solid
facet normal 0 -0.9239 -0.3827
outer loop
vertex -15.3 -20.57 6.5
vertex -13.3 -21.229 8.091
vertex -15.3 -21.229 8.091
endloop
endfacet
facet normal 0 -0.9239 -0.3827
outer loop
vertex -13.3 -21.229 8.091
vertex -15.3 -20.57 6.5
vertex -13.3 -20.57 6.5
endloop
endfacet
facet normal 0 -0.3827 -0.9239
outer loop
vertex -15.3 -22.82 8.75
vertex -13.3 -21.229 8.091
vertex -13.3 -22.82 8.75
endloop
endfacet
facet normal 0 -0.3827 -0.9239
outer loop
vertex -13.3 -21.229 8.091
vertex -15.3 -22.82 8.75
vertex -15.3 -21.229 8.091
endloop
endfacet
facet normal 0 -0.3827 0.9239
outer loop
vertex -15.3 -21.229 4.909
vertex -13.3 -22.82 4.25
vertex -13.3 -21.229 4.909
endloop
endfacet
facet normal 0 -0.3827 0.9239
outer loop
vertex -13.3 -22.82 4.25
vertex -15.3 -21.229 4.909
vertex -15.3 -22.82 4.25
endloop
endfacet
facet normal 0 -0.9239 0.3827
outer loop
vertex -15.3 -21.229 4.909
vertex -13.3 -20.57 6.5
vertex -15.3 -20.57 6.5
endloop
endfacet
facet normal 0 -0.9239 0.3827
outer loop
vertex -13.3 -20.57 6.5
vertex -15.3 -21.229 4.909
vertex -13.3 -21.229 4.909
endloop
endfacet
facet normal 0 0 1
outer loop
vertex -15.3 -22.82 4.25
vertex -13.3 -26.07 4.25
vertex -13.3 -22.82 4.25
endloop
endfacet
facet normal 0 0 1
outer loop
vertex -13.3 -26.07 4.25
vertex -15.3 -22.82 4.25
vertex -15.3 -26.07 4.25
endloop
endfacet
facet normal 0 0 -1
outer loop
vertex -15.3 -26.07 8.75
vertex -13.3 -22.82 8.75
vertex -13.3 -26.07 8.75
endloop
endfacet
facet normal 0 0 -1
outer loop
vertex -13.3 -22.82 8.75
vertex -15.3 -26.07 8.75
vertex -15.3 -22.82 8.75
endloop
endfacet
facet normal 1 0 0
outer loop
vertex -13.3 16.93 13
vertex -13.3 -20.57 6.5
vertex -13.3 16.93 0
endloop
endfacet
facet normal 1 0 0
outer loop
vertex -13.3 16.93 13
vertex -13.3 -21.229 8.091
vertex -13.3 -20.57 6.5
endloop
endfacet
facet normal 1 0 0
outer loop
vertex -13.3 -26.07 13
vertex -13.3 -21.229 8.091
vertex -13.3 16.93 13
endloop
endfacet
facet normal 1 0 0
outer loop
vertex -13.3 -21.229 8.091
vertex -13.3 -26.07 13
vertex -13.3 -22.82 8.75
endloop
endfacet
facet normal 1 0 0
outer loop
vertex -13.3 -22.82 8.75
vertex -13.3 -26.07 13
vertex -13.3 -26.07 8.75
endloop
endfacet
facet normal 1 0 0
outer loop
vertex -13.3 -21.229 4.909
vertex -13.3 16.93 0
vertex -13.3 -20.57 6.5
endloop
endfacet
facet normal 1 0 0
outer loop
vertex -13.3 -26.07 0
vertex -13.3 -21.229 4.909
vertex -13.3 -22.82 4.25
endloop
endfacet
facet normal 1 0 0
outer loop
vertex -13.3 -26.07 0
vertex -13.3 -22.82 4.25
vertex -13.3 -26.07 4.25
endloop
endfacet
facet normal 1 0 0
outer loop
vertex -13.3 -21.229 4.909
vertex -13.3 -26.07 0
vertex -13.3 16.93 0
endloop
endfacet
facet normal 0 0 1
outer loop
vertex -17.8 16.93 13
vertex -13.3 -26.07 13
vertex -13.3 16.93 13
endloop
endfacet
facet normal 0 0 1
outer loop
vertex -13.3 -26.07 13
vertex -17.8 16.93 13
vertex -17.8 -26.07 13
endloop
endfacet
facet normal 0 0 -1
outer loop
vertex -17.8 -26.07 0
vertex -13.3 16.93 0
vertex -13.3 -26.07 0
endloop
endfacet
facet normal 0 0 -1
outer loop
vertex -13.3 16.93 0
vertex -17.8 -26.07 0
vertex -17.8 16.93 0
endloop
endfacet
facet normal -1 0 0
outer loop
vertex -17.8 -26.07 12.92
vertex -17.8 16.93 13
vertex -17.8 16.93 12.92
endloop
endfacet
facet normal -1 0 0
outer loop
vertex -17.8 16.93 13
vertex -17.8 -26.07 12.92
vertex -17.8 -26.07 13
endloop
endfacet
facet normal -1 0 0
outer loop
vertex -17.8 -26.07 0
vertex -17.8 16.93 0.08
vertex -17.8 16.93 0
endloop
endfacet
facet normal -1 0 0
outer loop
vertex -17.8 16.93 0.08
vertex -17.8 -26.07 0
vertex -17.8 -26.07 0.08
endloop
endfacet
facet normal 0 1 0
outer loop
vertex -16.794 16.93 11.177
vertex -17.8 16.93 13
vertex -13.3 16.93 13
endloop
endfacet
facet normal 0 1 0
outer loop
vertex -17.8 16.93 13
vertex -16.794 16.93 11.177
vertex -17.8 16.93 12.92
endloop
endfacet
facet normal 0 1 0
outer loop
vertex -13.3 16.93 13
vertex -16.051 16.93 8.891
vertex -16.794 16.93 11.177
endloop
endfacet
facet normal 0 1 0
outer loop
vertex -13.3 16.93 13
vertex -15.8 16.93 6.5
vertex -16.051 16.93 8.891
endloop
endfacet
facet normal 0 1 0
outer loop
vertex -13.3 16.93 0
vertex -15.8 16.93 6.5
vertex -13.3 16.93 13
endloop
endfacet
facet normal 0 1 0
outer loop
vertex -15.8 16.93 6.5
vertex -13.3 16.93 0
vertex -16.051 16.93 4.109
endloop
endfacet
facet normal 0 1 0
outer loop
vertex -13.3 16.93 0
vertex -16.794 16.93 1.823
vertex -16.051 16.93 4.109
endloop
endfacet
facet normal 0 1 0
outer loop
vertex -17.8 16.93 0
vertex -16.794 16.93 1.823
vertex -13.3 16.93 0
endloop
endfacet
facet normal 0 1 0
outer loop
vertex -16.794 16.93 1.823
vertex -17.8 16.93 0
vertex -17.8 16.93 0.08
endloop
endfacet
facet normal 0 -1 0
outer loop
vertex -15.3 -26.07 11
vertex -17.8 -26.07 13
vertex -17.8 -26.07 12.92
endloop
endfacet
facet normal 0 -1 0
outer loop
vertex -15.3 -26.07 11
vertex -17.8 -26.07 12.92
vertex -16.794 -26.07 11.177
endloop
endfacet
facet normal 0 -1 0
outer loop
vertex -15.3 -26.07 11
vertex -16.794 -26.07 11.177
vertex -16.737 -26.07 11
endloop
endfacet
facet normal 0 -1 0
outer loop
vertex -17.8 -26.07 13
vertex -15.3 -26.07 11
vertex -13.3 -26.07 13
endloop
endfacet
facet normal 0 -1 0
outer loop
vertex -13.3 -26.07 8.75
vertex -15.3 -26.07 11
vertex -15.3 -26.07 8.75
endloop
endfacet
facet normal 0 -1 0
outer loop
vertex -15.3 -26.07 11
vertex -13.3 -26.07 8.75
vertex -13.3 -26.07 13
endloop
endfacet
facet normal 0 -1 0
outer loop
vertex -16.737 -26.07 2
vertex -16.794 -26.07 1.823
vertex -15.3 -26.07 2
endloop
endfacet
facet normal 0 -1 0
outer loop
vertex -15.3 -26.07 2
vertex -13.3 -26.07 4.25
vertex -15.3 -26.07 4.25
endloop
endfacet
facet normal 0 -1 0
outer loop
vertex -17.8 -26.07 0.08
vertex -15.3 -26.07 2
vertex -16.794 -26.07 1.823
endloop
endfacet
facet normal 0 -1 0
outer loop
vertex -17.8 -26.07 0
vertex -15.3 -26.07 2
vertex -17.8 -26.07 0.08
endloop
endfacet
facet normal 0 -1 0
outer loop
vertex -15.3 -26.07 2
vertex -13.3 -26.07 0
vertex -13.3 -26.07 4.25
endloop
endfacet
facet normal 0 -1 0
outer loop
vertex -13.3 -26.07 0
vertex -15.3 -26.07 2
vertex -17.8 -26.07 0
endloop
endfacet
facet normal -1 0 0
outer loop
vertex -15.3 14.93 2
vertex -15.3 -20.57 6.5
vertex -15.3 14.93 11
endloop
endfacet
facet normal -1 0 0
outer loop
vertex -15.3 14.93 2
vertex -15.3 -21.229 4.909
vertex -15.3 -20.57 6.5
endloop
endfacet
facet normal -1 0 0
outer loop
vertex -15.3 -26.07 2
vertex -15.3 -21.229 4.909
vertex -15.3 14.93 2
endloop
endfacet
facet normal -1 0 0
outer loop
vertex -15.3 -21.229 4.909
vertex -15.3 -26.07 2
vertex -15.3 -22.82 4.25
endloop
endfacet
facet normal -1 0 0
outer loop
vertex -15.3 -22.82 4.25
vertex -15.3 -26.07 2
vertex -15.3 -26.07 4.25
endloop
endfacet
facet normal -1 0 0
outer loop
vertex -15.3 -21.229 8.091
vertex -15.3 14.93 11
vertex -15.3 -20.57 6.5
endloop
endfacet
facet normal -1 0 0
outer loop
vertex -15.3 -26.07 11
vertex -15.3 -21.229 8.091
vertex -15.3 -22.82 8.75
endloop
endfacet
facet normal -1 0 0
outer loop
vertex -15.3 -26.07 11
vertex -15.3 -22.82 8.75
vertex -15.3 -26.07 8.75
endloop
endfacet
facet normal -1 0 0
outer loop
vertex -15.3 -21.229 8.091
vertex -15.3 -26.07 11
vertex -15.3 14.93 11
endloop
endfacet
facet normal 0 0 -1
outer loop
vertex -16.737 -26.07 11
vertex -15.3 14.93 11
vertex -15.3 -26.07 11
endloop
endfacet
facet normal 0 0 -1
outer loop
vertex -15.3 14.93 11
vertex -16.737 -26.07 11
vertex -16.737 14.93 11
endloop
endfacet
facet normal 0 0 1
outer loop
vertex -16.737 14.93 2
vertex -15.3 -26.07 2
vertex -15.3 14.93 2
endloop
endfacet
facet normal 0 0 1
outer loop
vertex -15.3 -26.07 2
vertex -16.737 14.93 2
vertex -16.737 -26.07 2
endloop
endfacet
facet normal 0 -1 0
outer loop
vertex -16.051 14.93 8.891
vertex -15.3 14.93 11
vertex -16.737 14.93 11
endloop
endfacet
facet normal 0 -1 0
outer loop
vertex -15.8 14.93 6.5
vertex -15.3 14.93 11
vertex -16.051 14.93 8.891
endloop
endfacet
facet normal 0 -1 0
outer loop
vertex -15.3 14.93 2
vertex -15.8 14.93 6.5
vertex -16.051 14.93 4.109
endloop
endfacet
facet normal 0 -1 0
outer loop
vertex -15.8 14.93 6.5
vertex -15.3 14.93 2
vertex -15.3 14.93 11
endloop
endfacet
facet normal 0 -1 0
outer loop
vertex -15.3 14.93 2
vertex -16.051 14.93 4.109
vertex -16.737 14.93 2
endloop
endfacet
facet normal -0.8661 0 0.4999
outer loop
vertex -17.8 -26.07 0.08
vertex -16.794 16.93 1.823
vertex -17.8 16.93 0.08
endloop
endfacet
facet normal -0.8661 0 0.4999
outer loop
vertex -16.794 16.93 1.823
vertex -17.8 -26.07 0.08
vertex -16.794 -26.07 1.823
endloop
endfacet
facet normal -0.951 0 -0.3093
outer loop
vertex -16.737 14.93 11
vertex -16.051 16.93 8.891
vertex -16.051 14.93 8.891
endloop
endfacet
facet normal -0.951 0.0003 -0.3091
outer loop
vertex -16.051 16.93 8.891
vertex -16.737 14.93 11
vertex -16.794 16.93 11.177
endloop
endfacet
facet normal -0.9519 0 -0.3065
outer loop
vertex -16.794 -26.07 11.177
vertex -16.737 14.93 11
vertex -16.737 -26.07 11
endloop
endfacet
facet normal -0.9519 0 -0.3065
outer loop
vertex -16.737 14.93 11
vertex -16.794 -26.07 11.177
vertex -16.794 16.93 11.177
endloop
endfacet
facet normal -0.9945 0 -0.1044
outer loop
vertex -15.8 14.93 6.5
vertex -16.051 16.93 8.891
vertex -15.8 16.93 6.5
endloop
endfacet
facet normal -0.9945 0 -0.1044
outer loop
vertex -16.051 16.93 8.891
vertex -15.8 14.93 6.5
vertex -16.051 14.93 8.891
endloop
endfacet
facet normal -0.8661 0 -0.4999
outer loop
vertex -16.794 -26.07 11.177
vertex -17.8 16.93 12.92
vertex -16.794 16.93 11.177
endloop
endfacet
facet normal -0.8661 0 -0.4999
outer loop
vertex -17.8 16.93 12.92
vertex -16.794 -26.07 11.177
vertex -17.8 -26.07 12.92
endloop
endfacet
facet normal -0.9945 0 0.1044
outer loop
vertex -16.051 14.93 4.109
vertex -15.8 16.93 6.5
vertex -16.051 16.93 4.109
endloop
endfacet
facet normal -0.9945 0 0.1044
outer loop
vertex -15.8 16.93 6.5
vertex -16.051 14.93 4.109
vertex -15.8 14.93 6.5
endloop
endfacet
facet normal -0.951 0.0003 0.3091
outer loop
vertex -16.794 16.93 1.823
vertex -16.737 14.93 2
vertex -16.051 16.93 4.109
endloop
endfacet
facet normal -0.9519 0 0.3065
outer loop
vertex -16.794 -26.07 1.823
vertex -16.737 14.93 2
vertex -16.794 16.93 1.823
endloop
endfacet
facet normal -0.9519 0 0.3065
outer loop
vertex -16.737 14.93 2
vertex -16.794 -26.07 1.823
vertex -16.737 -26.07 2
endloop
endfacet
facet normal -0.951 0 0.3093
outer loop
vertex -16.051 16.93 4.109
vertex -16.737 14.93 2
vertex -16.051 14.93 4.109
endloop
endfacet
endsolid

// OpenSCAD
module hole (z,r1,r2) {
    i = 1.5;
    translate([0,0,-1]) cylinder (z+2, r=r1);
    translate([0,0,-1]) cylinder (i+1, r=r2);
    translate([0,0,z-i]) cylinder (i+1, r=r2);
}

module slot (z) {
    s = 6.5;
    d = 10;
    translate([-d,-10,(z-s)/2]) cube([20,30,s]);
}
   
module body (x,y,z) {
    x2 = 13.5;
    difference() {
        rotate([0,0,-30]) translate([-x,-y,0]) cube([x,2*y,z]);
        translate([-x2-10,-2,-1]) cube([10,20,z+2]);
    }
    translate([-x2,-y,0]) cube([x2,2*y,z]);
    cylinder(z, r=y);    
}

module feedthrough (z) {
    rf = 4.5/2;
    translate([0,rf+1,z/2]) rotate([90,180,90]) {
        cylinder(5, r=rf);
        translate([0,-rf,0]) cube([5,2*rf,5]);
    }
}

module platform (z) {
    d = 43;
    e = 4.5;
    rm = 23/2;
    translate([-e,0,0]) difference() {
        cube([e,d,z]);
        translate([-2,-2,2]) cube([e,d,z-4]);
        translate([-rm+2,d+1,z/2]) rotate([90,0,0]) cylinder(d+2,r=rm);
        feedthrough(z);
    }
    
}

module hindge () {
    x = 20;
    y = 8;
    z = 13;
    s = 6.5;
    *difference() {
        body(x,y,z);
        hole(z,7/2,11/2);
        slot(z);
    }
    translate([-13.3,-26.07,0])
        platform(z);
}



hindge();
